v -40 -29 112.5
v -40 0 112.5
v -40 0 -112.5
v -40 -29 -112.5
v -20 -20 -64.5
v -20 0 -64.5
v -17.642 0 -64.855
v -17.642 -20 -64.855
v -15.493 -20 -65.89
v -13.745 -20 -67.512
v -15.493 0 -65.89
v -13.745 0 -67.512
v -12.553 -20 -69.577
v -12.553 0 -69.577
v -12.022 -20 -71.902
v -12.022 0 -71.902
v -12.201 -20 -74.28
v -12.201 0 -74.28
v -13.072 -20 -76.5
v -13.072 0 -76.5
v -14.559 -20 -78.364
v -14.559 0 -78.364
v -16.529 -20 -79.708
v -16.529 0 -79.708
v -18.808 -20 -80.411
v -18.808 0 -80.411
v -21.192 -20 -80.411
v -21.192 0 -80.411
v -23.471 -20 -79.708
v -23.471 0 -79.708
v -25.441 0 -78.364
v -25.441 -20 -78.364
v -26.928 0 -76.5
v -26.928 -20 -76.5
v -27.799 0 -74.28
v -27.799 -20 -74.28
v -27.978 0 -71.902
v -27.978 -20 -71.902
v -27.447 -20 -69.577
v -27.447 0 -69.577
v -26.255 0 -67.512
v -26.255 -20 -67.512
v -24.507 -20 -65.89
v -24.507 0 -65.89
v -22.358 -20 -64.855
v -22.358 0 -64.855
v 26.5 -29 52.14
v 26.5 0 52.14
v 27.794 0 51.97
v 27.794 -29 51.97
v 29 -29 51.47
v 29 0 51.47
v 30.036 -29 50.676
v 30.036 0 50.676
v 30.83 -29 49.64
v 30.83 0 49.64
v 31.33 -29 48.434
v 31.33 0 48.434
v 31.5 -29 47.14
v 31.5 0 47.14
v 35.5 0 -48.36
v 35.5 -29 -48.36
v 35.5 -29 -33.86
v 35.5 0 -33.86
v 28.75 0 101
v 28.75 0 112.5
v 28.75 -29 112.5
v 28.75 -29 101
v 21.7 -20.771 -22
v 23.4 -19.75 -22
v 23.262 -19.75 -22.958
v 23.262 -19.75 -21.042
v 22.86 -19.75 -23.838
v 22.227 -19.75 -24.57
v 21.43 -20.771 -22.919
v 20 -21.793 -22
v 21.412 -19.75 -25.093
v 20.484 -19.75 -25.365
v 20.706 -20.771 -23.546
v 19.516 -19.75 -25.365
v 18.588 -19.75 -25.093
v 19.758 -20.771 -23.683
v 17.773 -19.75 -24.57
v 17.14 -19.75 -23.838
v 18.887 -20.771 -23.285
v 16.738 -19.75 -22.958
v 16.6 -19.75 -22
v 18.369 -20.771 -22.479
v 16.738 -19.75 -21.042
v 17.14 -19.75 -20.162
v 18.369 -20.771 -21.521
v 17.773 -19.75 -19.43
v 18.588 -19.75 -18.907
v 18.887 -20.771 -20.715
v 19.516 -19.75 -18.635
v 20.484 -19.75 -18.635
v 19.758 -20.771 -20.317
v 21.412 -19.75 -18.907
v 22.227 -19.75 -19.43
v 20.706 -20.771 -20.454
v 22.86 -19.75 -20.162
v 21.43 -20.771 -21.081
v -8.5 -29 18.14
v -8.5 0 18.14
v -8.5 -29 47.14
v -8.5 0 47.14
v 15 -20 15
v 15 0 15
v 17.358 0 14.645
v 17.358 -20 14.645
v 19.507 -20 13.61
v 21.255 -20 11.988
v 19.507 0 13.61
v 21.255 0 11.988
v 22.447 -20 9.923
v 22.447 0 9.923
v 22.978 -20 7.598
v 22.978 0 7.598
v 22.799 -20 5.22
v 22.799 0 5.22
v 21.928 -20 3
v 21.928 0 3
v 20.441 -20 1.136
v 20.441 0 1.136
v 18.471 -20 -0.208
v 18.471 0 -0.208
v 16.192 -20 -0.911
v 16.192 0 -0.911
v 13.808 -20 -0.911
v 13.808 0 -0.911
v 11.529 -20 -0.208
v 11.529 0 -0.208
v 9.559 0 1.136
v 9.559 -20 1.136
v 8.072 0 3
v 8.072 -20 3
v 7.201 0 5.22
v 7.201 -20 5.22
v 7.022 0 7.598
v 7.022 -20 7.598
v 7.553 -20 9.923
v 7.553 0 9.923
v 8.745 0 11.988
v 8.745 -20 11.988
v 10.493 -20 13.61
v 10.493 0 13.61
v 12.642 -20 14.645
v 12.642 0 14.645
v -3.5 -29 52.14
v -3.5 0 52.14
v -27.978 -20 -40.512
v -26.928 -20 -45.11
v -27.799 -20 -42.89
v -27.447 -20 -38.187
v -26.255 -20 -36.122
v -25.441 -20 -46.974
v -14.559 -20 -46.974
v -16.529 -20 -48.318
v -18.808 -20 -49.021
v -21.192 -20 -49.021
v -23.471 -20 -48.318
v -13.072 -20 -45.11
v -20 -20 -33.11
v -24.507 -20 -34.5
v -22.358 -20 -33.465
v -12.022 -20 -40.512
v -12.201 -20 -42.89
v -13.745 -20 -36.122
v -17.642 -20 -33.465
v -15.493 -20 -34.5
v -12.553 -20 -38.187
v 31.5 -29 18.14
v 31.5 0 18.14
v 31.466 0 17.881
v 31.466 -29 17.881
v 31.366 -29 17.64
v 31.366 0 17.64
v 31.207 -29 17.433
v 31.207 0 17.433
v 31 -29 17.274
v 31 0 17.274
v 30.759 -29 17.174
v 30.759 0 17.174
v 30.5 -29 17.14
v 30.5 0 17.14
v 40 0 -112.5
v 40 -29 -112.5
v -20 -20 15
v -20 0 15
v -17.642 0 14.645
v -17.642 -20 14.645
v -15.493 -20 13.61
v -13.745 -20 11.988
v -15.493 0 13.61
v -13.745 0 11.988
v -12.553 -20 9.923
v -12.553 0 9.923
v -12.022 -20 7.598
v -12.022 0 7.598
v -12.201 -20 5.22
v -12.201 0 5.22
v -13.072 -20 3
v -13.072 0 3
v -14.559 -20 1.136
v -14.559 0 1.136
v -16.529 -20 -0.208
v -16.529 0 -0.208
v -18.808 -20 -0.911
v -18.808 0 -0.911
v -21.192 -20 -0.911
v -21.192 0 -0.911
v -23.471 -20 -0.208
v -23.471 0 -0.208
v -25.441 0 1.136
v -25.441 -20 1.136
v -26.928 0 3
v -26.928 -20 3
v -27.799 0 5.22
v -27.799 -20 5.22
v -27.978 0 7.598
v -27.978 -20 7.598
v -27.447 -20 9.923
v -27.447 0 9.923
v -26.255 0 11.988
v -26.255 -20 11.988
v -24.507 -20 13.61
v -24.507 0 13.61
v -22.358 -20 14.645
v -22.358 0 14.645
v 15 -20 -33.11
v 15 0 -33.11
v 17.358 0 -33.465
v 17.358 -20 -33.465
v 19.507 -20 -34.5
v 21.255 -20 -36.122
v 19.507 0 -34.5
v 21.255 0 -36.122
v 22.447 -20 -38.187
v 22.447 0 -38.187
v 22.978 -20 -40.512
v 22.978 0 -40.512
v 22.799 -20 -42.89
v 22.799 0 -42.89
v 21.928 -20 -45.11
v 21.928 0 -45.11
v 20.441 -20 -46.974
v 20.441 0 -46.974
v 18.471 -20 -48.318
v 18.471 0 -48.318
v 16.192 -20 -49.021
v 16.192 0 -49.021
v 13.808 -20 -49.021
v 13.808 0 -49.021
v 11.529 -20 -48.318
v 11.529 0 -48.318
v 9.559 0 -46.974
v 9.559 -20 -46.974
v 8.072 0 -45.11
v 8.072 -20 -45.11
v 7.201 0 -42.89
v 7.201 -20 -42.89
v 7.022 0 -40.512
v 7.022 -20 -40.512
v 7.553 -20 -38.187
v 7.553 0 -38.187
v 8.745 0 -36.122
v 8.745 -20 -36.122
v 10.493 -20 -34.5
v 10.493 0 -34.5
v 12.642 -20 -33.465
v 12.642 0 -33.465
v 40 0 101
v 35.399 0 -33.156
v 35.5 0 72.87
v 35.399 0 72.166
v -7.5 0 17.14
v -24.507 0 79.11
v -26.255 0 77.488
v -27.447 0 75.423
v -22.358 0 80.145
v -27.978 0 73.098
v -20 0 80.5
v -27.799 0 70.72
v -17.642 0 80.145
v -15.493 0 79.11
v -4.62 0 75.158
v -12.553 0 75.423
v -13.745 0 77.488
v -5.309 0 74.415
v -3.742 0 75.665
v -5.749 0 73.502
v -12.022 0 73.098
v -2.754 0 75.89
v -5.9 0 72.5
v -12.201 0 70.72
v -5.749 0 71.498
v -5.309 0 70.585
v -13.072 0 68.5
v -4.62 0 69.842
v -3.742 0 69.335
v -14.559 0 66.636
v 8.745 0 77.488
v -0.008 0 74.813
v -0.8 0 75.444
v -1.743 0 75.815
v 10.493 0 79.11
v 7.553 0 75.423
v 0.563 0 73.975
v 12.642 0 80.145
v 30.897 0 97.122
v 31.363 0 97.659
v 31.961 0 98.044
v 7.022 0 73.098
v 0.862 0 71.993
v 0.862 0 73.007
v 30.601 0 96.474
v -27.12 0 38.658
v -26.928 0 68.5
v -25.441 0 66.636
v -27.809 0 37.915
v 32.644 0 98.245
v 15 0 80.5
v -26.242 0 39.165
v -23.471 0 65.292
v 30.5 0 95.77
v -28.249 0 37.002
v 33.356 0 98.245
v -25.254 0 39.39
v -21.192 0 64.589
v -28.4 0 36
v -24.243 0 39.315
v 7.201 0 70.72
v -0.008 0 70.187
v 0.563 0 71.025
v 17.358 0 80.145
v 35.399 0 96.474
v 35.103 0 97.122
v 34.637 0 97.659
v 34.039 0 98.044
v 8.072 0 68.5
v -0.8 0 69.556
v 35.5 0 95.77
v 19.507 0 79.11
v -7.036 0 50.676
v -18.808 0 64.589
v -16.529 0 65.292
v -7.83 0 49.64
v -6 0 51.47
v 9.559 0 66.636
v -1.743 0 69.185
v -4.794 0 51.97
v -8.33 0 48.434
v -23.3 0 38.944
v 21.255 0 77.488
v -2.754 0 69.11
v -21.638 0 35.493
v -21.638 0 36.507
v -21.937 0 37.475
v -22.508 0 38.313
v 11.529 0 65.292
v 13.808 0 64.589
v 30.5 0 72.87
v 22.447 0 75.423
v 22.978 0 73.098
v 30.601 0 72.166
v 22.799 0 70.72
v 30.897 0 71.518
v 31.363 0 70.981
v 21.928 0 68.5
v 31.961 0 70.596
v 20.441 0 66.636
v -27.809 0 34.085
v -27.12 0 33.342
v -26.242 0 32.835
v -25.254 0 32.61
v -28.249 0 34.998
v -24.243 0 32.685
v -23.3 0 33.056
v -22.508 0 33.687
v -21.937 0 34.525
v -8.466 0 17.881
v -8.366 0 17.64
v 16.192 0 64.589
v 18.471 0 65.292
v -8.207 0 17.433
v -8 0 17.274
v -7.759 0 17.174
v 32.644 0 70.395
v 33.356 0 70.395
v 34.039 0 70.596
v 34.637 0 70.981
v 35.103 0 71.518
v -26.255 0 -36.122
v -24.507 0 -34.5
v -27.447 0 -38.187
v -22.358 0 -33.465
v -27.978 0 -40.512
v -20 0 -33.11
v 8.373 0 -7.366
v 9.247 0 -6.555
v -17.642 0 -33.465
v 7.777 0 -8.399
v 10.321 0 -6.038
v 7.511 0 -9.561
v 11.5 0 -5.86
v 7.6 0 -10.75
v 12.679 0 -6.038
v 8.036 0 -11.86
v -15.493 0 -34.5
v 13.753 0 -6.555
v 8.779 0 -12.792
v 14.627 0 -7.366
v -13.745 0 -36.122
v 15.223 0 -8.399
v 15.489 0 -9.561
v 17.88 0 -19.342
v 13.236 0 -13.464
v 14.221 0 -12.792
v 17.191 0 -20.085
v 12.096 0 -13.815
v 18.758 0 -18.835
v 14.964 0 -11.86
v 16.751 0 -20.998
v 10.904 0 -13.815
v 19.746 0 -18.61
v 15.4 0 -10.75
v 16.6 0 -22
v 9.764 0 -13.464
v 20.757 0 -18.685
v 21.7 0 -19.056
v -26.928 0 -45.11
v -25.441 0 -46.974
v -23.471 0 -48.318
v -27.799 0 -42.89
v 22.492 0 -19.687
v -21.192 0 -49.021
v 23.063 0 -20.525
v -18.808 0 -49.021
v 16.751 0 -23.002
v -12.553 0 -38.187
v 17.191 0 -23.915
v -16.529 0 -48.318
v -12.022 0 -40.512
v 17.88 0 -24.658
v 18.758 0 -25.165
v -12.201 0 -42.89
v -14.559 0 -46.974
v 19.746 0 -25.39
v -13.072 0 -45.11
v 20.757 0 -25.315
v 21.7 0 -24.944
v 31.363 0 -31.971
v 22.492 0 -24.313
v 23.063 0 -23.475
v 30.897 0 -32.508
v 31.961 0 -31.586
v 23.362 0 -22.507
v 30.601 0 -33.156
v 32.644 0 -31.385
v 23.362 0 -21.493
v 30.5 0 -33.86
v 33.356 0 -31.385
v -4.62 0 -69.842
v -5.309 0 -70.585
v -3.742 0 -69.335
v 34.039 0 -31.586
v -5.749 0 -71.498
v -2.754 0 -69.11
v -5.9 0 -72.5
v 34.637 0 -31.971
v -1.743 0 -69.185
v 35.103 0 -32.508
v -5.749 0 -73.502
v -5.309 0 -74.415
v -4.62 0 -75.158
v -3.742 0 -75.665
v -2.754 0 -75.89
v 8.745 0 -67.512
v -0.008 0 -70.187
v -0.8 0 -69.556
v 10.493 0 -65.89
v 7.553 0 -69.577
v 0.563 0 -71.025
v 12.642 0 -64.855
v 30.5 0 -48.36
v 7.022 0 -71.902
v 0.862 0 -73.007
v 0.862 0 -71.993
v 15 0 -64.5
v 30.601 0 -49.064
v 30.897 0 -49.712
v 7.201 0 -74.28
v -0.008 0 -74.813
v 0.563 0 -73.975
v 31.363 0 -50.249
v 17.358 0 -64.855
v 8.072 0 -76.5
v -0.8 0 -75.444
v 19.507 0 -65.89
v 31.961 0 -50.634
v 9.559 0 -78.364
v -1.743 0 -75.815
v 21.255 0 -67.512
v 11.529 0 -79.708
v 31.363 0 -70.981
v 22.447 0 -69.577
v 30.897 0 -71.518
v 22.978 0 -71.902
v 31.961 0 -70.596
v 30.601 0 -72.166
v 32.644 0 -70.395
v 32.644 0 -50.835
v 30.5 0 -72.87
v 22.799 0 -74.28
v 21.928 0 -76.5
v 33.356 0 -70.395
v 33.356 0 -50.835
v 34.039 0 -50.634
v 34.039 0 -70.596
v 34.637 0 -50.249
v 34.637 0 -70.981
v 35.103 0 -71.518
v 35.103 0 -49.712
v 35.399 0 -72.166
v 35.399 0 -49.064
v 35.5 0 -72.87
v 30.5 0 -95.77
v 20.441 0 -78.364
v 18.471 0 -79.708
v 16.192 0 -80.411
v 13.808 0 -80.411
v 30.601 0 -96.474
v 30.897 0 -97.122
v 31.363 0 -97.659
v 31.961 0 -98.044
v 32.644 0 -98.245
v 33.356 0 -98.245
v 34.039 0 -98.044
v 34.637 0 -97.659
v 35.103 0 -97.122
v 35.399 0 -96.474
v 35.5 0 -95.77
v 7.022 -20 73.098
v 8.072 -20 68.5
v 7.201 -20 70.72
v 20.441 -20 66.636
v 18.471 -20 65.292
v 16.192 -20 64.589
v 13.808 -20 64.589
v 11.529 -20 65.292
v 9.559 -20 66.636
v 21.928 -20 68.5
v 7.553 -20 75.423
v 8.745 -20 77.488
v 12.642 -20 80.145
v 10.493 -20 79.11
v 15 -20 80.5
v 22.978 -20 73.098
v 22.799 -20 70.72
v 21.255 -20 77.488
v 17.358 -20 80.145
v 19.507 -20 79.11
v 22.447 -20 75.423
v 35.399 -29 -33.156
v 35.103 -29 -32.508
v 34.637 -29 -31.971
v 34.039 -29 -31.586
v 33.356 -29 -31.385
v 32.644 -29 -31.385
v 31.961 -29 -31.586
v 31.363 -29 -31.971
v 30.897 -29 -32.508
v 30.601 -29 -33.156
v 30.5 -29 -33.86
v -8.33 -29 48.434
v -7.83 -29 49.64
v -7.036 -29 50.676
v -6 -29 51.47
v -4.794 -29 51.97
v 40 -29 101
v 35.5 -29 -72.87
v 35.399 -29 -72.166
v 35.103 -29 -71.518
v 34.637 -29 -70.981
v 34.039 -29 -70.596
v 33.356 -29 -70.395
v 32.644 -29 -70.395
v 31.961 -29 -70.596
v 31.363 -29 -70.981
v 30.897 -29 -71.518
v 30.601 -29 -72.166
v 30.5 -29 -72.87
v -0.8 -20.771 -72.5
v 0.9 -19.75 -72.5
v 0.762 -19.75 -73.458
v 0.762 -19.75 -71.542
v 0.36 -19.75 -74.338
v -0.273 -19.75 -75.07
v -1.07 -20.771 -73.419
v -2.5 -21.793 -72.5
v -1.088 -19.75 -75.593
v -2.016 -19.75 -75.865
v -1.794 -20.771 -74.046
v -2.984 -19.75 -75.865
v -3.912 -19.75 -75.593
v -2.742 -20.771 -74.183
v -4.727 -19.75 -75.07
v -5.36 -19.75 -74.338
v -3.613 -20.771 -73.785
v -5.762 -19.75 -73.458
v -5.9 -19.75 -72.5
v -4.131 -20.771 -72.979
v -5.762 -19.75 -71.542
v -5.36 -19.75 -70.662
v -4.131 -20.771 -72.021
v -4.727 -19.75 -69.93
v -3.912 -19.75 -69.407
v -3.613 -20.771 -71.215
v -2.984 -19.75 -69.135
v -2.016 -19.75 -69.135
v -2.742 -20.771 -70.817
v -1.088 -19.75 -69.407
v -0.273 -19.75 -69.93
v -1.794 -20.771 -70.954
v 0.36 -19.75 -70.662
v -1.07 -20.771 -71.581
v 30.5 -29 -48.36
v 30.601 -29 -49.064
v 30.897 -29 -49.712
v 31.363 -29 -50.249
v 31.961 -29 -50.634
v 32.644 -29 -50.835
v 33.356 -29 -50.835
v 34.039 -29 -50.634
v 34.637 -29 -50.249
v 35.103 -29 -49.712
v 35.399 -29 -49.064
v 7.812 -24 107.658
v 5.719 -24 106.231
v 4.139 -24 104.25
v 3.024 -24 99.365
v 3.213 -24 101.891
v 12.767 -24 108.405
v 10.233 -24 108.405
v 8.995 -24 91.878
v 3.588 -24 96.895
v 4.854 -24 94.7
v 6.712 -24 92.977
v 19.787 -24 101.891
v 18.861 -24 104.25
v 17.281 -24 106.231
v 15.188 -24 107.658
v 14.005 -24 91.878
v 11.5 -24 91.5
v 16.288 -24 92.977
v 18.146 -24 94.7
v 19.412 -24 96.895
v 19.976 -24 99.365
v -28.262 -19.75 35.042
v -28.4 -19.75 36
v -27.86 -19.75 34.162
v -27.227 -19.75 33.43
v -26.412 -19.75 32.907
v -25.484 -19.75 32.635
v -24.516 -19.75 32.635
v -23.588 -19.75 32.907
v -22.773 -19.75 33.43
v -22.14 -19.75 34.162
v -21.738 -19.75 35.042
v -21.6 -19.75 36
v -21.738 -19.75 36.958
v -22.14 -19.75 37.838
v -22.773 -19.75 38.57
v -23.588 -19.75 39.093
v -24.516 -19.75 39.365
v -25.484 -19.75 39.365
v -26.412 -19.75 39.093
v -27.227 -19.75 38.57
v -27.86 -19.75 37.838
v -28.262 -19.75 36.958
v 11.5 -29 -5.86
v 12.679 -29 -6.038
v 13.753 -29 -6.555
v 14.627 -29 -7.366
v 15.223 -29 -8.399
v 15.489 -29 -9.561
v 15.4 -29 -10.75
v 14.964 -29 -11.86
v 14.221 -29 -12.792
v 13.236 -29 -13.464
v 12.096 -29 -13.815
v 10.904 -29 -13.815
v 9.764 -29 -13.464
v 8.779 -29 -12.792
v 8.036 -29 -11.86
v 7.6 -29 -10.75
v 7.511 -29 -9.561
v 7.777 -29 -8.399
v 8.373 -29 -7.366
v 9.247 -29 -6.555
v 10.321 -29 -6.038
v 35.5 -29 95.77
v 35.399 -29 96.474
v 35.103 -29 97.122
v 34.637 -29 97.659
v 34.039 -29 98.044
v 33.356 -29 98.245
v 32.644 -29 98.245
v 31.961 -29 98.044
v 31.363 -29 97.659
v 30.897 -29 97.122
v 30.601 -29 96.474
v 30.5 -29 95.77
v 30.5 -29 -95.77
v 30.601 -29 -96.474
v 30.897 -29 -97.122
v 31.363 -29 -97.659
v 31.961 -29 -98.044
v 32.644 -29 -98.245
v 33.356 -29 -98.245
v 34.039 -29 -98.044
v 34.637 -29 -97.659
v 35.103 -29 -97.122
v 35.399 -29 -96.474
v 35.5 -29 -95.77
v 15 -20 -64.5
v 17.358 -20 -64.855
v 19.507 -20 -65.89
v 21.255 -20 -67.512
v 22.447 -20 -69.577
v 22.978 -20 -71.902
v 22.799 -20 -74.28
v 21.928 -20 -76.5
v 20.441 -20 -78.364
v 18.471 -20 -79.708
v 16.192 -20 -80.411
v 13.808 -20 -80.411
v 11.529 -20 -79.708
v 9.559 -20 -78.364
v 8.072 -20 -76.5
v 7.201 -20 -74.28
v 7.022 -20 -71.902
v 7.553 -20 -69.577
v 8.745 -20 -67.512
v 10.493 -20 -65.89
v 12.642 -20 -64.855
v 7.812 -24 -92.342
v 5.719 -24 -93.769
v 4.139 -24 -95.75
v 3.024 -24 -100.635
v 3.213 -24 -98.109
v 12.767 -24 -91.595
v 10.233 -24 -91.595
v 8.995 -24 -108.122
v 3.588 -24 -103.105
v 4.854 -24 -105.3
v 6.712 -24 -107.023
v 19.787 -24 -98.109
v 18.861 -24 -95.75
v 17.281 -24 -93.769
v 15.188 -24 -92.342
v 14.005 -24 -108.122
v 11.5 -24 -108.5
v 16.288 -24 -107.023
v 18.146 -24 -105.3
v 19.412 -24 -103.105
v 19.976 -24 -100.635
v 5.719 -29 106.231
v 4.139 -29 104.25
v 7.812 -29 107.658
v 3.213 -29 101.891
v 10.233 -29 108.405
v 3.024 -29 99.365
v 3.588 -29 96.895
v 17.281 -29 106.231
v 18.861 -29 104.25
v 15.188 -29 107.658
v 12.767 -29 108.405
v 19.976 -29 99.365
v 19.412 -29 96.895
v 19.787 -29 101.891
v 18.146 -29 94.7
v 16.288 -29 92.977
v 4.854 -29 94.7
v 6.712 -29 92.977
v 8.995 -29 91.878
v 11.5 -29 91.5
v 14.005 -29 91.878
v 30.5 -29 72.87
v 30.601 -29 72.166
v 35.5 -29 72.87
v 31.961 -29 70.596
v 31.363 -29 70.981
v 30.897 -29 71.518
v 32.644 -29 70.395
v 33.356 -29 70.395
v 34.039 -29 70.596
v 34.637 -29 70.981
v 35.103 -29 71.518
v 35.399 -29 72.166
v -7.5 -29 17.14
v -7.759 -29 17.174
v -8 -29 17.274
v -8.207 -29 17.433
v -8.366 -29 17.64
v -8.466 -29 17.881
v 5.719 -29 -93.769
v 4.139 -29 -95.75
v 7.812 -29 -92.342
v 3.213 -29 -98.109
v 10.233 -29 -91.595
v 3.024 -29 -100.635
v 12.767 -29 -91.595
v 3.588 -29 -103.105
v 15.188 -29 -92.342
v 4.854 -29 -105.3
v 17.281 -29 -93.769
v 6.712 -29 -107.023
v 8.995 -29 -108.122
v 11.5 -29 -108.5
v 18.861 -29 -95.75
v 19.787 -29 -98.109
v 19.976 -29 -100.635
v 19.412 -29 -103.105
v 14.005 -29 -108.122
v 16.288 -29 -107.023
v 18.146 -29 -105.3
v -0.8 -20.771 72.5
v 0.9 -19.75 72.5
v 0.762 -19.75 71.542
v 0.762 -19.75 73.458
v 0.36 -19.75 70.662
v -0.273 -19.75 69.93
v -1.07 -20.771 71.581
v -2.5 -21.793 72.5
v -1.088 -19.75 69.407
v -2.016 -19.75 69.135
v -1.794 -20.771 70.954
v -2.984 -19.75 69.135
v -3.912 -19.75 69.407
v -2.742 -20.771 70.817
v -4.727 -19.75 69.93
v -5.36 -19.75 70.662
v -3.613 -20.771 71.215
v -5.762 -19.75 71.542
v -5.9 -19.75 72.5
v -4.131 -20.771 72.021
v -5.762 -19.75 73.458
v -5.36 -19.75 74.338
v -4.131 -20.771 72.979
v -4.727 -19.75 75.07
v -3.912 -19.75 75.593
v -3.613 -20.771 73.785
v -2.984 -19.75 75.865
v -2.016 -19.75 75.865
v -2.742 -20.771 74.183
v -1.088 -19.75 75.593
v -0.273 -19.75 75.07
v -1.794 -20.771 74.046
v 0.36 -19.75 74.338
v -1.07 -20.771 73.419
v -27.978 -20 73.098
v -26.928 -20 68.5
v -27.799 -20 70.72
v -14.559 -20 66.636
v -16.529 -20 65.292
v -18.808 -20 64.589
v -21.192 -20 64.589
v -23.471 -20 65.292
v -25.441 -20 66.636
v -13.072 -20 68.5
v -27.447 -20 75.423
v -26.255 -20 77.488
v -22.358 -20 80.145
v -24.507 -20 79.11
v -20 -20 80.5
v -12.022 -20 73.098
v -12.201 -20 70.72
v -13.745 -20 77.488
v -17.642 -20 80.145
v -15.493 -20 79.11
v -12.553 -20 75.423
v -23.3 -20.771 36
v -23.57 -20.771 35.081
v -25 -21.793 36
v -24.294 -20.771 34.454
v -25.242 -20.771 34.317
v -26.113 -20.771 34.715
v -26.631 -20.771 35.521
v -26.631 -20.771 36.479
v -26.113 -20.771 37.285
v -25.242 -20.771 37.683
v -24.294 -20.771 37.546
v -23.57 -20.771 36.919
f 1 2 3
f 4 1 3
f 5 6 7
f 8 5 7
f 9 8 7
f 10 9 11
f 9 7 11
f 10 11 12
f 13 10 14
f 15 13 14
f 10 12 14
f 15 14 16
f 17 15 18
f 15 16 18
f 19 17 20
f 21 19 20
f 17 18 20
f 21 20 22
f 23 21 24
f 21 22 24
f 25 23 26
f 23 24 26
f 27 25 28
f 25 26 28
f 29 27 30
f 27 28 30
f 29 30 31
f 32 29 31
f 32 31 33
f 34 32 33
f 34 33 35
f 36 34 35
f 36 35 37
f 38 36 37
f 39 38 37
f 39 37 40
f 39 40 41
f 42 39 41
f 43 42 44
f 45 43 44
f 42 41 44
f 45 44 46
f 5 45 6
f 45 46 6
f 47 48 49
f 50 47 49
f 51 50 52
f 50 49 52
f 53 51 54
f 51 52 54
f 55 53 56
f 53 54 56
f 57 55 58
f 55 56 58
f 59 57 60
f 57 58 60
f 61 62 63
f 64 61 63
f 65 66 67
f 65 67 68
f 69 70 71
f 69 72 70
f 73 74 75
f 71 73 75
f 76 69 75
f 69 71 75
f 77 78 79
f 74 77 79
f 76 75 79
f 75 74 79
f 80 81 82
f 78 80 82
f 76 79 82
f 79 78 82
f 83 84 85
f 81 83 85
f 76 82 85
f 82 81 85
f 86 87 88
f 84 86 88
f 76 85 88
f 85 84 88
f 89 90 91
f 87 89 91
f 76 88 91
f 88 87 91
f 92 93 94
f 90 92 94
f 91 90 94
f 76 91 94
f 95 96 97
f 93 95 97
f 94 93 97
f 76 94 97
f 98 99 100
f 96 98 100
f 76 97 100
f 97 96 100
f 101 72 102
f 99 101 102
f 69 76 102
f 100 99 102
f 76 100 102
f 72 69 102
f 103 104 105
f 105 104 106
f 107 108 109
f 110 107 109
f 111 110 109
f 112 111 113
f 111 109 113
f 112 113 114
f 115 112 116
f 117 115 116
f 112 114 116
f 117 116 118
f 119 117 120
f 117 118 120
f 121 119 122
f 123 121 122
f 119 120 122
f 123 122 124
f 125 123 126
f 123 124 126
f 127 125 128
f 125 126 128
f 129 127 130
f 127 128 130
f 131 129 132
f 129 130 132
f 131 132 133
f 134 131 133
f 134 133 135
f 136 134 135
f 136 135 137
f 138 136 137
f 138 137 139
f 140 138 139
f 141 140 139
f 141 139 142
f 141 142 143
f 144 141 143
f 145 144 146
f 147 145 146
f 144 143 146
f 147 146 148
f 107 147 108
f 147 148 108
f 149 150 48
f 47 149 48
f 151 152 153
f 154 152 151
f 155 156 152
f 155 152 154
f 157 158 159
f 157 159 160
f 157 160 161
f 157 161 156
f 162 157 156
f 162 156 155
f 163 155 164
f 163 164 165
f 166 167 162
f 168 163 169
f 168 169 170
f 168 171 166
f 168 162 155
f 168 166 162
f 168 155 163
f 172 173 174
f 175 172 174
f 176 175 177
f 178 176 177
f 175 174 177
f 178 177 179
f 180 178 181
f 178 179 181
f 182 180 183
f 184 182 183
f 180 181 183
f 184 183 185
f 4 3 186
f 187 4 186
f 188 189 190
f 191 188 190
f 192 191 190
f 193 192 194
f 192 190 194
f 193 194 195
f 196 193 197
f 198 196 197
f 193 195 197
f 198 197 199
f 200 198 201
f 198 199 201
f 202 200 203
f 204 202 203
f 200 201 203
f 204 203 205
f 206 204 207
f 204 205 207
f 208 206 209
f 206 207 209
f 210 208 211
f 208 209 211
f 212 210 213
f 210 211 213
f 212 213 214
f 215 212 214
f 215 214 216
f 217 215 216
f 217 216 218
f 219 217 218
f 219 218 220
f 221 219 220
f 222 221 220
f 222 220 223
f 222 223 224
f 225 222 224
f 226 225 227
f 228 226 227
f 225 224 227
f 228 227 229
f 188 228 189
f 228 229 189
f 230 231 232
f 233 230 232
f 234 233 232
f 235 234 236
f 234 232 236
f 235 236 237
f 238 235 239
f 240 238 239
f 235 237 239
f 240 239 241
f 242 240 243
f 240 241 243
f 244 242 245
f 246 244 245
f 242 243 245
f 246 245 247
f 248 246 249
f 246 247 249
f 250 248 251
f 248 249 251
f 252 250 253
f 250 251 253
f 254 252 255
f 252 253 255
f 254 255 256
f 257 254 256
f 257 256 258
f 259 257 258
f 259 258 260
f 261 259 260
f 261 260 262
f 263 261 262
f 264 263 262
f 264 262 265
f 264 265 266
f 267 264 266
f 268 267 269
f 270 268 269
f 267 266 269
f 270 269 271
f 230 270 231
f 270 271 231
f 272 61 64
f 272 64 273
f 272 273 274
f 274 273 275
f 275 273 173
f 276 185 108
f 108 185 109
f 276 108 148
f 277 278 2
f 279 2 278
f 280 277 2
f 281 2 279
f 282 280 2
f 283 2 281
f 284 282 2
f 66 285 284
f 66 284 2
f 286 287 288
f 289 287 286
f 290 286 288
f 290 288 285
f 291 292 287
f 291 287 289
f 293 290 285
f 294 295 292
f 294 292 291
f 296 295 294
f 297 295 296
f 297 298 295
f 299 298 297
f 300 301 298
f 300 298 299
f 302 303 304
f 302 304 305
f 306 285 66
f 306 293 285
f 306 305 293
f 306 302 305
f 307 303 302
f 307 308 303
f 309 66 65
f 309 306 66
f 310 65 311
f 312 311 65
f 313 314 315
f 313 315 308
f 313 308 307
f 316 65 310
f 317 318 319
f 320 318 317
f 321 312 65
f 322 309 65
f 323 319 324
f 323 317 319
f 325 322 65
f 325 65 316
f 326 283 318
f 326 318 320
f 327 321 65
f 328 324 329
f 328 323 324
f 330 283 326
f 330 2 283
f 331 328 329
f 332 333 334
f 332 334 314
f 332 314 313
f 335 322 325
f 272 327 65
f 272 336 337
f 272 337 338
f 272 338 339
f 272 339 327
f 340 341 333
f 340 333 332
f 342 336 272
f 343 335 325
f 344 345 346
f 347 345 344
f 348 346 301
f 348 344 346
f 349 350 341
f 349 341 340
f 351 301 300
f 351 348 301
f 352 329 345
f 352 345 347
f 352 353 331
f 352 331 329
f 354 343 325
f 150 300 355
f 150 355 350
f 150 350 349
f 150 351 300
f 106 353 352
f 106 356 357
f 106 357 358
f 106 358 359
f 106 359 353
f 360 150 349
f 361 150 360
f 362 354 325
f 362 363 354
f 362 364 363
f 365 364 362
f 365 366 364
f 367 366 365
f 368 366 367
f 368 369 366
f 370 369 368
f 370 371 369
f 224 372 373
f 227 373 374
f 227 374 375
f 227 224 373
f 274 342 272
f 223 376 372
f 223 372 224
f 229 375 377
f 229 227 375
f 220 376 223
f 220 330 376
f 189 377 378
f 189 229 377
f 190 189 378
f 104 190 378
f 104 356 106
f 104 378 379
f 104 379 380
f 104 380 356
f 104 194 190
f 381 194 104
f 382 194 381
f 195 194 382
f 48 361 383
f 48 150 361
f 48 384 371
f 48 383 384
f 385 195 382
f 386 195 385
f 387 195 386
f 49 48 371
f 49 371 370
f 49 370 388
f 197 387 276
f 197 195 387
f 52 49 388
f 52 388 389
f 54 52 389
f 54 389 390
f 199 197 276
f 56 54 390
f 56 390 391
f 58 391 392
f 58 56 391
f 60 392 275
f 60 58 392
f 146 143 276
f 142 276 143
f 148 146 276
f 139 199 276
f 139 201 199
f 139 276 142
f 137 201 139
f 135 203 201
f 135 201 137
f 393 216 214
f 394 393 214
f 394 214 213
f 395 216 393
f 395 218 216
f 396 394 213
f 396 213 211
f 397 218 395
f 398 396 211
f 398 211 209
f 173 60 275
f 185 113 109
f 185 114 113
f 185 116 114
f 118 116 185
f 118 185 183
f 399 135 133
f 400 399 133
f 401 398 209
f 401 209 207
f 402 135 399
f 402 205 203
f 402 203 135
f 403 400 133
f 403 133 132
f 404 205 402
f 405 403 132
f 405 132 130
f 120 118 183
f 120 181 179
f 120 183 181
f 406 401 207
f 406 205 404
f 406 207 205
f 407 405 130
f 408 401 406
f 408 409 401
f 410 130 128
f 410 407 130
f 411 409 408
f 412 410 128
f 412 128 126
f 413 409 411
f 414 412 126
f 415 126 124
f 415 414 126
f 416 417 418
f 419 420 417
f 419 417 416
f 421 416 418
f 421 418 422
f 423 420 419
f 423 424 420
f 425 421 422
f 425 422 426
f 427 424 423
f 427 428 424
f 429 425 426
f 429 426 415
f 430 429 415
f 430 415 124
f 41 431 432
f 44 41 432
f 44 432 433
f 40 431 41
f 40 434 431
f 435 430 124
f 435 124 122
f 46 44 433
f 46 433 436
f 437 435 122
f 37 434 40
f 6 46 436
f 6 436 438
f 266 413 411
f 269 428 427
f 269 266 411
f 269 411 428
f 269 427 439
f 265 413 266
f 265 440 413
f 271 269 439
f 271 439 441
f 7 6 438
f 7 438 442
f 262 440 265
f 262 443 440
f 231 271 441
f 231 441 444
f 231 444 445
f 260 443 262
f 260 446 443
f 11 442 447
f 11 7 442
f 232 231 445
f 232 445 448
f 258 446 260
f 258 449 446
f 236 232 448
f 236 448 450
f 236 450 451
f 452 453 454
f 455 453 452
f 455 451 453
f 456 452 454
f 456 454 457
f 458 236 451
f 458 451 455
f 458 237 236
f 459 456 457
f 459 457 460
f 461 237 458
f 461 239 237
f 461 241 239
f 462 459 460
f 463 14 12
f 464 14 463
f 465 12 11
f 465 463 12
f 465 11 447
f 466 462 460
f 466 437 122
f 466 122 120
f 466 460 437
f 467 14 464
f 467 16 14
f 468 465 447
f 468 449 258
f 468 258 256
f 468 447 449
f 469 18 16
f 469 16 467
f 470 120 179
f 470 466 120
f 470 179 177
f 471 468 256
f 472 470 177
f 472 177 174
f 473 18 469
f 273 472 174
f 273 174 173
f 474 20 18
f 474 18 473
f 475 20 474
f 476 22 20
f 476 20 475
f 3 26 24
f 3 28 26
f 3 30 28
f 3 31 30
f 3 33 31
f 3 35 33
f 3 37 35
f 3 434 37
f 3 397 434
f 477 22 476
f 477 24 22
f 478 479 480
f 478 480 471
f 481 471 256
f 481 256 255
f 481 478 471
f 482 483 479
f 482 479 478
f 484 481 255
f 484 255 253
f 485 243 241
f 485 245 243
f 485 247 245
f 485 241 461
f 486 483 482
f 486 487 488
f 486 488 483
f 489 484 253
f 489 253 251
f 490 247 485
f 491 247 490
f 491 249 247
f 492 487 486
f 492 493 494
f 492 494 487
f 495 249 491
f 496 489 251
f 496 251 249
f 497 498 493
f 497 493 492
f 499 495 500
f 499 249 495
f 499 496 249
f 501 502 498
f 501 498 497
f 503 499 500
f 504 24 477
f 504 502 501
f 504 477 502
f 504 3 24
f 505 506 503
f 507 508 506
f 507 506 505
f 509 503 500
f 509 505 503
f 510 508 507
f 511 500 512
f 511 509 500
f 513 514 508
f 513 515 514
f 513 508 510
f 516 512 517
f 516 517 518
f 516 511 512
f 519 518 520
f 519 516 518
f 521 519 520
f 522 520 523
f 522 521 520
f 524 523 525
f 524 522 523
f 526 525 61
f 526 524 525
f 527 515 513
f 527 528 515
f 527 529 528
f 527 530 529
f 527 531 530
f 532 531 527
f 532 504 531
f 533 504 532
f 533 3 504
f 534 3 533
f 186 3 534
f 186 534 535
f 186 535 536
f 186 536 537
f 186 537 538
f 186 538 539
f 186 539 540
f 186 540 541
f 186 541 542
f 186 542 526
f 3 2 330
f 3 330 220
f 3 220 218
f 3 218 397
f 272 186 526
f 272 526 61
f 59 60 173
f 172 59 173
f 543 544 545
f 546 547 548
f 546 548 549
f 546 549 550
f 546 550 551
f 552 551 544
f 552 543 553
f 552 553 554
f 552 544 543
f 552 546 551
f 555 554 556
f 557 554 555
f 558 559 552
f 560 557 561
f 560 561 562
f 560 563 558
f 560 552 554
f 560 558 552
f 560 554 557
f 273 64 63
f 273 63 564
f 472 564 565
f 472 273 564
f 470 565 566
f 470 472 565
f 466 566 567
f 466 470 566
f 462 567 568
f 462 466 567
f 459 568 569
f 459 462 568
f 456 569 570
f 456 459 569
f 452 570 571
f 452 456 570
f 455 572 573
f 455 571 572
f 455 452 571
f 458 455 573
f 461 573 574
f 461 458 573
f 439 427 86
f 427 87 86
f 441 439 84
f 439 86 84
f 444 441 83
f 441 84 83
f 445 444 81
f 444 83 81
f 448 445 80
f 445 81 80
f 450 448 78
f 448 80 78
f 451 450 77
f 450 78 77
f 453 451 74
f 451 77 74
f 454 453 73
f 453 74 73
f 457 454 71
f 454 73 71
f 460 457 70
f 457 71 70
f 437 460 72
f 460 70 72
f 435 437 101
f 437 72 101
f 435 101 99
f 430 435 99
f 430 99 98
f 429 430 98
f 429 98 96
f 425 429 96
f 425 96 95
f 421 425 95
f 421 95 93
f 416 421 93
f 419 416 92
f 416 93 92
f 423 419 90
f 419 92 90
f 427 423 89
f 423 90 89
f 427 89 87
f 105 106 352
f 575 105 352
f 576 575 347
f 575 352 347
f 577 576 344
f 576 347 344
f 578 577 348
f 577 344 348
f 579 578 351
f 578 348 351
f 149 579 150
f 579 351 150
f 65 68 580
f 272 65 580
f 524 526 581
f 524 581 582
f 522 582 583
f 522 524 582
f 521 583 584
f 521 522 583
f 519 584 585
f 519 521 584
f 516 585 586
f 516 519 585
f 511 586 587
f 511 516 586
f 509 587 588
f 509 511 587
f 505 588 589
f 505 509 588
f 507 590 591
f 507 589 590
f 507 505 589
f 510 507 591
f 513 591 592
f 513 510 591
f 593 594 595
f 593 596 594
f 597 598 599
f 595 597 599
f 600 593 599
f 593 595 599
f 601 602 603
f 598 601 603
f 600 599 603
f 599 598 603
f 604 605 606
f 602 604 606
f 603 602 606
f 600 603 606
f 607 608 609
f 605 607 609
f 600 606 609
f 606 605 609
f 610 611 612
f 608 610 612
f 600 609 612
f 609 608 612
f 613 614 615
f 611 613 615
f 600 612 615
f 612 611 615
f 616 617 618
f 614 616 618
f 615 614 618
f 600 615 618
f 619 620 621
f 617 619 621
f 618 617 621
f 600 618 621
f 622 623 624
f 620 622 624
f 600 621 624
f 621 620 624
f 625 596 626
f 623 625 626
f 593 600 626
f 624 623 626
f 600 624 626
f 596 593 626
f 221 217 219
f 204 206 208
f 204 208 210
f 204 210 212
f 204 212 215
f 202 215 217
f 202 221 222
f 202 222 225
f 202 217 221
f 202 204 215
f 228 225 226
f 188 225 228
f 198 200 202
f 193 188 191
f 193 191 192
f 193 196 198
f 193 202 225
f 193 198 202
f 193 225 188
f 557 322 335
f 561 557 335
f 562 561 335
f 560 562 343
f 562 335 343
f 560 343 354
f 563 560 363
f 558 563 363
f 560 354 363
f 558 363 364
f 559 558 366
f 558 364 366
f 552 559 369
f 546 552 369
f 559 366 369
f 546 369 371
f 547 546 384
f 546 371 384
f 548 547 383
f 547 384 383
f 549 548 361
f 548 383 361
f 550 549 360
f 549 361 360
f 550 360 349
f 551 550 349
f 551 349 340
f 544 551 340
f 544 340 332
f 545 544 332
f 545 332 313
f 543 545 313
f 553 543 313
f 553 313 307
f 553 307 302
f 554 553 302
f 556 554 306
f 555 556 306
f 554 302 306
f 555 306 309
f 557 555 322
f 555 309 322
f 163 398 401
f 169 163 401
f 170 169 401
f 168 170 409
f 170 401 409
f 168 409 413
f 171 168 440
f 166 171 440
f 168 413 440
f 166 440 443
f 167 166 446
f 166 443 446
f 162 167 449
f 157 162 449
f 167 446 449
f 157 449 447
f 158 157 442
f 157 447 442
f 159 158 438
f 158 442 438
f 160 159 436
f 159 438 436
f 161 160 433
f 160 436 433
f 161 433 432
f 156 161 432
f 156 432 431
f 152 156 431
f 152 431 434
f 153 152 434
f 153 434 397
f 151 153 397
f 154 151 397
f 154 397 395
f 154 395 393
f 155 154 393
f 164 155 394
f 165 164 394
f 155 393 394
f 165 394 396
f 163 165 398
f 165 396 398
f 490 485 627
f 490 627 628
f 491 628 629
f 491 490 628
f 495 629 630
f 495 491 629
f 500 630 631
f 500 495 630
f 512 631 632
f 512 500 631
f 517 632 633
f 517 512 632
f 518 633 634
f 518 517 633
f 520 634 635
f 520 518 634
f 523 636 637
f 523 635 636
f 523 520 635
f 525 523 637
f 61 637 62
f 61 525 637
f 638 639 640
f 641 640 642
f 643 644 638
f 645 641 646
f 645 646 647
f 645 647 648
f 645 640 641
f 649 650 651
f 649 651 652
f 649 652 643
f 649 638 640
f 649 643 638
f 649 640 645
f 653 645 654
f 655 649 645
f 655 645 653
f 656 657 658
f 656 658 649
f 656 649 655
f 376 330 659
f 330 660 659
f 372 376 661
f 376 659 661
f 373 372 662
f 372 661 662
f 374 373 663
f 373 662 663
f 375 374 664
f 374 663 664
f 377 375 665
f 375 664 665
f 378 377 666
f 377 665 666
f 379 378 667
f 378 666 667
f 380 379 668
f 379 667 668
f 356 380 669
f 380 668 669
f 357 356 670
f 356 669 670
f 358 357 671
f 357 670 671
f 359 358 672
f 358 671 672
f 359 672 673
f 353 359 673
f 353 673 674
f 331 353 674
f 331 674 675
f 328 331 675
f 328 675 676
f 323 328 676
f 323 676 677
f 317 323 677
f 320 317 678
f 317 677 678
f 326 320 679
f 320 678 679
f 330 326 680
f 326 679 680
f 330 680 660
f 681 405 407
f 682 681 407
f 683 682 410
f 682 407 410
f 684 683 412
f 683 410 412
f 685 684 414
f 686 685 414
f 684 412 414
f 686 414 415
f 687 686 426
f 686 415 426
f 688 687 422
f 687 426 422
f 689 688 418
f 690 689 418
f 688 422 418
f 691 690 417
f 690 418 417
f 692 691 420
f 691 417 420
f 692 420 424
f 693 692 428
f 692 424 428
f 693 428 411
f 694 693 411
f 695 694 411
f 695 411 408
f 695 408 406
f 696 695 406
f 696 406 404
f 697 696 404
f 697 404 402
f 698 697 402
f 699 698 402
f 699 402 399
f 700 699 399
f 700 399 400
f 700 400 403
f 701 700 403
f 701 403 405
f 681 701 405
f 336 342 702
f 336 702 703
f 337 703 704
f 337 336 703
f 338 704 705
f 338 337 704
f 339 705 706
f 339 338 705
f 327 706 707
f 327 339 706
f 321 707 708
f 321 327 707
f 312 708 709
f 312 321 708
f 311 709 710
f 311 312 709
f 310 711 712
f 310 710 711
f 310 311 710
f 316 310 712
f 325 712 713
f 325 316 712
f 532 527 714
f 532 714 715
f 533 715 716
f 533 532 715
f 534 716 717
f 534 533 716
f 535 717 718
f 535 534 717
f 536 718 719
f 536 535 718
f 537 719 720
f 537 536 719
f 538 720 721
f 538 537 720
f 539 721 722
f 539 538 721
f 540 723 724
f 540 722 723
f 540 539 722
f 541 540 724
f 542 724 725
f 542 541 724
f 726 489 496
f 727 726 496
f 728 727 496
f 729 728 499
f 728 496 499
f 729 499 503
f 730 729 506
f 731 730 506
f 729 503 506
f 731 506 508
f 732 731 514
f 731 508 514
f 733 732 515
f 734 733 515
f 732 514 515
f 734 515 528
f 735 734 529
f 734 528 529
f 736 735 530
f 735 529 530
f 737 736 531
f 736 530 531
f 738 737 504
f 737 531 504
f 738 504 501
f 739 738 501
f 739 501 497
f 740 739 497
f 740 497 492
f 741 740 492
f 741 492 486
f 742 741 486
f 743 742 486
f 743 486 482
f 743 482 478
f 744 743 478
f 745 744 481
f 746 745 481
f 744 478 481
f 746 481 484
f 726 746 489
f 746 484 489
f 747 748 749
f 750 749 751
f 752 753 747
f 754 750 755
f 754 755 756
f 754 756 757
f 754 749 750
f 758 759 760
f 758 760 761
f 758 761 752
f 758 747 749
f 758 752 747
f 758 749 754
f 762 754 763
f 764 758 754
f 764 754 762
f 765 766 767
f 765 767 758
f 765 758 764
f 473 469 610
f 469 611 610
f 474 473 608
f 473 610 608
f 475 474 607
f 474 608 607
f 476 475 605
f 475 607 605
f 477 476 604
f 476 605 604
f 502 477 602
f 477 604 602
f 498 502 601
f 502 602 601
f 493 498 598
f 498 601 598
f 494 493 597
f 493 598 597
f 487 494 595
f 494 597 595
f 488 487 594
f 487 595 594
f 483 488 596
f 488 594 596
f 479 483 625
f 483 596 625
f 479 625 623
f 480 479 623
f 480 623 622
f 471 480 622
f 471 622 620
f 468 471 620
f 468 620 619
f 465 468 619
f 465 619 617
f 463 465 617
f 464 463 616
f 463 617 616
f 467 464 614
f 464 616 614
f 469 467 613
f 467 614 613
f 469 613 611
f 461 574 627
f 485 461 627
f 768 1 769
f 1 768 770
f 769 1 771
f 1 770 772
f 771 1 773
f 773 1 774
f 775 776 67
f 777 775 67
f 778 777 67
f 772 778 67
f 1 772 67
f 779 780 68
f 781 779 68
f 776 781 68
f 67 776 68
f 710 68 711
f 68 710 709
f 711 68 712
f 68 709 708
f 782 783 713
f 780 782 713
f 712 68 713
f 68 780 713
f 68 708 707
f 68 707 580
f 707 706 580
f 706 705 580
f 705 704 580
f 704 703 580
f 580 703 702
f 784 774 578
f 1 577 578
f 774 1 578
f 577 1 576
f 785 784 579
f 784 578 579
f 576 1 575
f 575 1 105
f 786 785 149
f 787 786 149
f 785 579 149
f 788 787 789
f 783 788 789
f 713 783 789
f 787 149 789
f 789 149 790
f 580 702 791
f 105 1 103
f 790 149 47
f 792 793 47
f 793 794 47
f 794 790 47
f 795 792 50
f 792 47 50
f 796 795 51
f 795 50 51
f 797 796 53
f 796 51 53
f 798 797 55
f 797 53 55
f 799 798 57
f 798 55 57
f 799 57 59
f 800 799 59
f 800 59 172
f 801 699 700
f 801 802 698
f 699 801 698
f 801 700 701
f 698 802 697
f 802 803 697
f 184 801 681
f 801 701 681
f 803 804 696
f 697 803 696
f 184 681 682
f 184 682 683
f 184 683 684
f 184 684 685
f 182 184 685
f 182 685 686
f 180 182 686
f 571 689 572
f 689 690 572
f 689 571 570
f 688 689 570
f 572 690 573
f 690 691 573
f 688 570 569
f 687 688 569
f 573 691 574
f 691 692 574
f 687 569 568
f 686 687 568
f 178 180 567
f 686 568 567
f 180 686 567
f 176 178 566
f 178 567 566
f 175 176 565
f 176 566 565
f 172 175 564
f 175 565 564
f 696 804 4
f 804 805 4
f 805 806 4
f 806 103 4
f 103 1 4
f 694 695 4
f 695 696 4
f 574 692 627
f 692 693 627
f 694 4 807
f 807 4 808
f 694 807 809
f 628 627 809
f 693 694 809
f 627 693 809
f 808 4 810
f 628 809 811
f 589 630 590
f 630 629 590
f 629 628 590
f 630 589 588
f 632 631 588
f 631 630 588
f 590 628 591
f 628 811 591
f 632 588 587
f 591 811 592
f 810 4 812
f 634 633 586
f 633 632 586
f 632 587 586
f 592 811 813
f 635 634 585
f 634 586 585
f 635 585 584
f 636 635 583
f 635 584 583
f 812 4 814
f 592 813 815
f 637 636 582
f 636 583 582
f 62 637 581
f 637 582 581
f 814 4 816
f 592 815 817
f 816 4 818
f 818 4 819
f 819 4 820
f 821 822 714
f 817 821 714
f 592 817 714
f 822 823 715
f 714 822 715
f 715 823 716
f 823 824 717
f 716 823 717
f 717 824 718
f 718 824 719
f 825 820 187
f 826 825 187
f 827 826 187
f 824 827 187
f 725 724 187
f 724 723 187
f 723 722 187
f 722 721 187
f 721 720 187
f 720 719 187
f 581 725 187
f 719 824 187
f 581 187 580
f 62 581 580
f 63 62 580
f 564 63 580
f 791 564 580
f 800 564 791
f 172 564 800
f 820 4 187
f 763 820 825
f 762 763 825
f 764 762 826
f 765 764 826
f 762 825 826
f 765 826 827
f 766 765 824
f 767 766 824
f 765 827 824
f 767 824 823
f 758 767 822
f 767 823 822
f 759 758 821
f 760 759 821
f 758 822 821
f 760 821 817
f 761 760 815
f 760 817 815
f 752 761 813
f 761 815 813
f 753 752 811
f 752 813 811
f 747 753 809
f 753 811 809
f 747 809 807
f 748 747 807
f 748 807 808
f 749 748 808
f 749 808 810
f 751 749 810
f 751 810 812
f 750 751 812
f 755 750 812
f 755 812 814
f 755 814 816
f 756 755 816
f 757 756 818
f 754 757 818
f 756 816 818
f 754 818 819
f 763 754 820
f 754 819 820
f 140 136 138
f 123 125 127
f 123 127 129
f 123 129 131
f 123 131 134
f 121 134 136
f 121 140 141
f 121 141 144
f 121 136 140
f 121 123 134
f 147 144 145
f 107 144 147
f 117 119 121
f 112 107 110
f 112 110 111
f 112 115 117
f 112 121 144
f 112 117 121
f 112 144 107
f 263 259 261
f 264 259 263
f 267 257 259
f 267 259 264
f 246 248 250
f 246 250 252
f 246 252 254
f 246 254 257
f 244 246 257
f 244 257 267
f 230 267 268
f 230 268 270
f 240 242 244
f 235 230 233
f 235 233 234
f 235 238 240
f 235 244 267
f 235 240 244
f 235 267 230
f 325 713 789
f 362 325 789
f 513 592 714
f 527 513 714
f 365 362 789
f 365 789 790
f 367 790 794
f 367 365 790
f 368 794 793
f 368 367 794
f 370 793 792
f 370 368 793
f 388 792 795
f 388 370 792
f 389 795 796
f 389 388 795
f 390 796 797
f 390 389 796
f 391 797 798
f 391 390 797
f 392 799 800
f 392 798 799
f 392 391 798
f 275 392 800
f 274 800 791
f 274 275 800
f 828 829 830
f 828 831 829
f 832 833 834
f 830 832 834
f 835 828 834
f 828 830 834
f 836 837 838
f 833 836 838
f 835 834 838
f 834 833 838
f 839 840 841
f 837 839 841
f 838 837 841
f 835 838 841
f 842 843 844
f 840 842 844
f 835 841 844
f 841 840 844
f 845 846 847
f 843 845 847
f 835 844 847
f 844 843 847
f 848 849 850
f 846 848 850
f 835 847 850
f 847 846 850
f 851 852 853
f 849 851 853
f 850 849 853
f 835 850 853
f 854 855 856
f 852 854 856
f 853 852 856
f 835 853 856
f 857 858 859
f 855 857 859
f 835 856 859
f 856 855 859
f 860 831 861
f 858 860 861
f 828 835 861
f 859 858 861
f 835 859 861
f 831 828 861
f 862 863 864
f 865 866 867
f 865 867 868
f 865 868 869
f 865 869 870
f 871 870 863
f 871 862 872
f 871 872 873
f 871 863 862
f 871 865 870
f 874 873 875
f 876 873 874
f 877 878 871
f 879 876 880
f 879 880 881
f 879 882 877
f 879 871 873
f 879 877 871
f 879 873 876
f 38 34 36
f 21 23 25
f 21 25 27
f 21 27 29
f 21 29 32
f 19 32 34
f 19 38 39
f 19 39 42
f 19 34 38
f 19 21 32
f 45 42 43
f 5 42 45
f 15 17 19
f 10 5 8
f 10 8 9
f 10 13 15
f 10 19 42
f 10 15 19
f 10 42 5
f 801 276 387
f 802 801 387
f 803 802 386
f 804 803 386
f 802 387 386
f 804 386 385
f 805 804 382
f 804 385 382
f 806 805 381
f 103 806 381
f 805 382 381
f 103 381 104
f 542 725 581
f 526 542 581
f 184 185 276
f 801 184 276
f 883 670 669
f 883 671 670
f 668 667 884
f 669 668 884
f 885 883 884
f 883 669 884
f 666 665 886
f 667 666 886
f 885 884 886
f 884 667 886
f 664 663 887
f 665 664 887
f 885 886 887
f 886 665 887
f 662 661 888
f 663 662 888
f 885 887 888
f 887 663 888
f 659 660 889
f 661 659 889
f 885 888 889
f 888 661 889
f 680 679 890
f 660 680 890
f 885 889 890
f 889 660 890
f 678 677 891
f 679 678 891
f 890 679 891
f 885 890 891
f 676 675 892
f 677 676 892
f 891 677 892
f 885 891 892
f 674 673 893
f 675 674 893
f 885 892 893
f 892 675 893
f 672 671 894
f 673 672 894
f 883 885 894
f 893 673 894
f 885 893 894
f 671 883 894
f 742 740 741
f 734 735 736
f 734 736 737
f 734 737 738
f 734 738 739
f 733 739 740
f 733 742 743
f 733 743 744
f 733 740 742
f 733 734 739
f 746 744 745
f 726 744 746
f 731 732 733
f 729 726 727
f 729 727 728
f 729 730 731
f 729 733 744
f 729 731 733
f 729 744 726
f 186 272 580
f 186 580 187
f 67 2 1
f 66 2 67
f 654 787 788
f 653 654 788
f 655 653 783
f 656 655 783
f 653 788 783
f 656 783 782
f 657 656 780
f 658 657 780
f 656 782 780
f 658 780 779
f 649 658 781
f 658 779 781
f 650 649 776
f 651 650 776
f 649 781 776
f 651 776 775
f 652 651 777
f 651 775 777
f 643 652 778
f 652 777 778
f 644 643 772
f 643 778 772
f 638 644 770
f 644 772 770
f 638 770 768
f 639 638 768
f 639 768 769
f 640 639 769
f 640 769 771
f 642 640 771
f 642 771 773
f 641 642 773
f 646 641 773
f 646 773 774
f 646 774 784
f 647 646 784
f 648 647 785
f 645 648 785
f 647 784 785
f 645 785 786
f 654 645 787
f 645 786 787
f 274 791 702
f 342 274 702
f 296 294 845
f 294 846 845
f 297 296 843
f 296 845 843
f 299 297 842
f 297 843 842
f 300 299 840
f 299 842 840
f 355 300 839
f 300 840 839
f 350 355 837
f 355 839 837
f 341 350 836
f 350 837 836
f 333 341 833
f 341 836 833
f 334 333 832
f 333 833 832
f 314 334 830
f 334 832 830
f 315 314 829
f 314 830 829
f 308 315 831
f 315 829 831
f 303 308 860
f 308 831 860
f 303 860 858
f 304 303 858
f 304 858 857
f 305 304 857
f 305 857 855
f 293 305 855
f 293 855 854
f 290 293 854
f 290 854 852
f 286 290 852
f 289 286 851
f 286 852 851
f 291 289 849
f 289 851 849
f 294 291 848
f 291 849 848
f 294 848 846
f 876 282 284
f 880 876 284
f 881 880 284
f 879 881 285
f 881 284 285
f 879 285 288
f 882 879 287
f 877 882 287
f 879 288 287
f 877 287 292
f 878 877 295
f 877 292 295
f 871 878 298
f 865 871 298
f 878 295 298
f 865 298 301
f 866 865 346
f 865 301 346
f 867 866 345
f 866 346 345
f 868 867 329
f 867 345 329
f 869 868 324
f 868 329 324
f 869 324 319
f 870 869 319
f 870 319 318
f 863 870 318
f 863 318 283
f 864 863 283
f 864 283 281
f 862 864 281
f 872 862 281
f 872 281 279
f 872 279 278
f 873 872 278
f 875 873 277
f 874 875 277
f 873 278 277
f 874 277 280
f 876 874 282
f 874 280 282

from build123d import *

# Parameters (mm, degrees)
SKETCH1_W             = 80
SKETCH1_H             = 225
BOSS_EXTRUDE1_DEPTH   = 29
CUT_EXTRUDE1_REACH    = 124.871
SKETCH3_R             = 8
CUT_EXTRUDE2_DEPTH    = 20
M8_TAPPED_HOLE1_D     = 6.8
M8_TAPPED_HOLE1_DEPTH = 19.75
M8_TAPPED_HOLE1_TIP   = 2.042926105
CUT_EXTRUDE3_REACH    = 124.871
SKETCH15_W            = 12
SKETCH15_H            = 11.5
SKETCH16_R            = 8.5
CUT_EXTRUDE4_DEPTH    = 5
CUT_EXTRUDE5_REACH    = 124.871
SKETCH17_R            = 4


with BuildPart() as part:
    # Sketch1 → Boss-Extrude1 (new body)
    with BuildSketch(Plane(origin=(0, 0, 0), x_dir=(1, 0, 0), z_dir=(0, 1, 0))):
        Rectangle(SKETCH1_W, SKETCH1_H)
    extrude(amount=-BOSS_EXTRUDE1_DEPTH)

    # Sketch2 → Cut-Extrude1 (cut, up to next)
    with BuildSketch(Plane(origin=(0, 0, 0), x_dir=(1, 0, 0), z_dir=(0, 1, 0)), mode=Mode.PRIVATE) as cut_extrude1_sk1:
        with BuildLine():
            Line((30.5, 72.87), (30.5, 95.77))
            ThreePointArc((30.5, 95.77), (33, 98.27), (35.5, 95.77))
            Line((35.5, 95.77), (35.5, 72.87))
            ThreePointArc((35.5, 72.87), (33, 70.37), (30.5, 72.87))
        make_face()
    cut_extrude1_tool1 = extrude(cut_extrude1_sk1.sketch, amount=-CUT_EXTRUDE1_REACH, mode=Mode.PRIVATE) & part.part
    # Sketch2 → Cut-Extrude1 (cut, up to next)
    with BuildSketch(Plane(origin=(0, 0, 0), x_dir=(1, 0, 0), z_dir=(0, 1, 0)), mode=Mode.PRIVATE) as cut_extrude1_sk2:
        with BuildLine():
            Line((30.5, 33.86), (30.5, 48.36))
            ThreePointArc((30.5, 48.36), (33, 50.86), (35.5, 48.36))
            Line((35.5, 48.36), (35.5, 33.86))
            ThreePointArc((35.5, 33.86), (33, 31.36), (30.5, 33.86))
        make_face()
    cut_extrude1_tool2 = extrude(cut_extrude1_sk2.sketch, amount=-CUT_EXTRUDE1_REACH, mode=Mode.PRIVATE) & part.part
    # Sketch2 → Cut-Extrude1 (cut, up to next)
    with BuildSketch(Plane(origin=(0, 0, 0), x_dir=(1, 0, 0), z_dir=(0, 1, 0)), mode=Mode.PRIVATE) as cut_extrude1_sk3:
        with BuildLine():
            Line((31.5, -47.14), (31.5, -18.14))
            ThreePointArc((31.5, -18.14), (31.207106781, -17.432893219), (30.5, -17.14))
            Line((30.5, -17.14), (-7.5, -17.14))
            ThreePointArc((-7.5, -17.14), (-8.207106781, -17.432893219), (-8.5, -18.14))
            Line((-8.5, -18.14), (-8.5, -47.14))
            ThreePointArc((-8.5, -47.14), (-7.035533906, -50.675533906), (-3.5, -52.14))
            Line((-3.5, -52.14), (26.5, -52.14))
            ThreePointArc((26.5, -52.14), (30.035533906, -50.675533906), (31.5, -47.14))
        make_face()
    cut_extrude1_tool3 = extrude(cut_extrude1_sk3.sketch, amount=-CUT_EXTRUDE1_REACH, mode=Mode.PRIVATE) & part.part
    # Sketch2 → Cut-Extrude1 (cut, up to next)
    with BuildSketch(Plane(origin=(0, 0, 0), x_dir=(1, 0, 0), z_dir=(0, 1, 0)), mode=Mode.PRIVATE) as cut_extrude1_sk4:
        with BuildLine():
            Line((30.5, -95.77), (30.5, -72.87))
            ThreePointArc((30.5, -72.87), (33, -70.37), (35.5, -72.87))
            Line((35.5, -72.87), (35.5, -95.77))
            ThreePointArc((35.5, -95.77), (33, -98.27), (30.5, -95.77))
        make_face()
    cut_extrude1_tool4 = extrude(cut_extrude1_sk4.sketch, amount=-CUT_EXTRUDE1_REACH, mode=Mode.PRIVATE) & part.part
    add(cut_extrude1_tool1.solids().sort_by_distance((33, 0, -84.32))[0], mode=Mode.SUBTRACT)
    add(cut_extrude1_tool2.solids().sort_by_distance((33, 0, -41.11))[0], mode=Mode.SUBTRACT)
    add(cut_extrude1_tool3.solids().sort_by_distance((11.5, 0, 34.518764))[0], mode=Mode.SUBTRACT)
    add(cut_extrude1_tool4.solids().sort_by_distance((33, 0, 84.32))[0], mode=Mode.SUBTRACT)

    # Sketch3 → Cut-Extrude2 (cut)
    with BuildSketch(Plane(origin=(0, 0, 0), x_dir=(1, 0, 0), z_dir=(0, 1, 0))):
        with Locations(Location((15, 72.5, 0), (0, 0, 270))):
            Circle(SKETCH3_R)
        with Locations(Location((15, 41.11, 0), (0, 0, 270))):
            Circle(SKETCH3_R)
        with Locations(Location((15, -7, 0), (0, 0, 270))):
            Circle(SKETCH3_R)
        with Locations(Location((15, -72.5, 0), (0, 0, 270))):
            Circle(SKETCH3_R)
        with Locations(Location((-20, -72.5, 0), (0, 0, 270))):
            Circle(SKETCH3_R)
        with Locations(Location((-20, -7, 0), (0, 0, 270))):
            Circle(SKETCH3_R)
        with Locations(Location((-20, 41.11, 0), (0, 0, 270))):
            Circle(SKETCH3_R)
        with Locations(Location((-20, 72.5, 0), (0, 0, 270))):
            Circle(SKETCH3_R)
    extrude(amount=-CUT_EXTRUDE2_DEPTH, mode=Mode.SUBTRACT)

    # M8 Tapped Hole1
    with Locations(Plane(origin=(0, 0, 0), x_dir=(1, 0, 0), z_dir=(0, 1, 0))):
        with Locations((-25, -36), (20, 22), (-2.5, 72.5), (-2.5, -72.5)):
            Hole(M8_TAPPED_HOLE1_D / 2, depth=M8_TAPPED_HOLE1_DEPTH)
            with Locations((0, 0, -(M8_TAPPED_HOLE1_DEPTH + M8_TAPPED_HOLE1_TIP / 2))):  # 118° drill point
                Cone(0, M8_TAPPED_HOLE1_D / 2, M8_TAPPED_HOLE1_TIP, mode=Mode.SUBTRACT)

    # Sketch15 → Cut-Extrude3 (cut, up to next)
    with BuildSketch(Plane(origin=(0, 0, 0), x_dir=(1, 0, 0), z_dir=(0, 1, 0)), mode=Mode.PRIVATE) as cut_extrude3_sk1:
        with Locations((34.75, -106.75)):
            Rectangle(SKETCH15_W, SKETCH15_H)
    cut_extrude3_tool1 = extrude(cut_extrude3_sk1.sketch, amount=-CUT_EXTRUDE3_REACH, mode=Mode.PRIVATE) & part.part
    add(cut_extrude3_tool1.solids().sort_by_distance((34.75, 0, 106.75))[0], mode=Mode.SUBTRACT)

    # Sketch16 → Cut-Extrude4 (cut)
    with BuildSketch(Plane.XZ.offset(29)):
        with Locations(Location((11.5, 100, 0), (0, 0, 270))):
            Circle(SKETCH16_R)
        with Locations(Location((11.5, -100, 0), (0, 0, 270))):
            Circle(SKETCH16_R)
    extrude(amount=-CUT_EXTRUDE4_DEPTH, mode=Mode.SUBTRACT)

    # Sketch17 → Cut-Extrude5 (cut, up to next)
    with BuildSketch(Plane(origin=(0, 0, 0), x_dir=(1, 0, 0), z_dir=(0, 1, 0)), mode=Mode.PRIVATE) as cut_extrude5_sk1:
        with Locations(Location((11.5, 9.86, 0), (0, 0, 270))):
            Circle(SKETCH17_R)
    cut_extrude5_tool1 = extrude(cut_extrude5_sk1.sketch, amount=-CUT_EXTRUDE5_REACH, mode=Mode.PRIVATE) & part.part
    add(cut_extrude5_tool1.solids().sort_by_distance((11.5, 0, -9.86))[0], mode=Mode.SUBTRACT)


solid = part.part
